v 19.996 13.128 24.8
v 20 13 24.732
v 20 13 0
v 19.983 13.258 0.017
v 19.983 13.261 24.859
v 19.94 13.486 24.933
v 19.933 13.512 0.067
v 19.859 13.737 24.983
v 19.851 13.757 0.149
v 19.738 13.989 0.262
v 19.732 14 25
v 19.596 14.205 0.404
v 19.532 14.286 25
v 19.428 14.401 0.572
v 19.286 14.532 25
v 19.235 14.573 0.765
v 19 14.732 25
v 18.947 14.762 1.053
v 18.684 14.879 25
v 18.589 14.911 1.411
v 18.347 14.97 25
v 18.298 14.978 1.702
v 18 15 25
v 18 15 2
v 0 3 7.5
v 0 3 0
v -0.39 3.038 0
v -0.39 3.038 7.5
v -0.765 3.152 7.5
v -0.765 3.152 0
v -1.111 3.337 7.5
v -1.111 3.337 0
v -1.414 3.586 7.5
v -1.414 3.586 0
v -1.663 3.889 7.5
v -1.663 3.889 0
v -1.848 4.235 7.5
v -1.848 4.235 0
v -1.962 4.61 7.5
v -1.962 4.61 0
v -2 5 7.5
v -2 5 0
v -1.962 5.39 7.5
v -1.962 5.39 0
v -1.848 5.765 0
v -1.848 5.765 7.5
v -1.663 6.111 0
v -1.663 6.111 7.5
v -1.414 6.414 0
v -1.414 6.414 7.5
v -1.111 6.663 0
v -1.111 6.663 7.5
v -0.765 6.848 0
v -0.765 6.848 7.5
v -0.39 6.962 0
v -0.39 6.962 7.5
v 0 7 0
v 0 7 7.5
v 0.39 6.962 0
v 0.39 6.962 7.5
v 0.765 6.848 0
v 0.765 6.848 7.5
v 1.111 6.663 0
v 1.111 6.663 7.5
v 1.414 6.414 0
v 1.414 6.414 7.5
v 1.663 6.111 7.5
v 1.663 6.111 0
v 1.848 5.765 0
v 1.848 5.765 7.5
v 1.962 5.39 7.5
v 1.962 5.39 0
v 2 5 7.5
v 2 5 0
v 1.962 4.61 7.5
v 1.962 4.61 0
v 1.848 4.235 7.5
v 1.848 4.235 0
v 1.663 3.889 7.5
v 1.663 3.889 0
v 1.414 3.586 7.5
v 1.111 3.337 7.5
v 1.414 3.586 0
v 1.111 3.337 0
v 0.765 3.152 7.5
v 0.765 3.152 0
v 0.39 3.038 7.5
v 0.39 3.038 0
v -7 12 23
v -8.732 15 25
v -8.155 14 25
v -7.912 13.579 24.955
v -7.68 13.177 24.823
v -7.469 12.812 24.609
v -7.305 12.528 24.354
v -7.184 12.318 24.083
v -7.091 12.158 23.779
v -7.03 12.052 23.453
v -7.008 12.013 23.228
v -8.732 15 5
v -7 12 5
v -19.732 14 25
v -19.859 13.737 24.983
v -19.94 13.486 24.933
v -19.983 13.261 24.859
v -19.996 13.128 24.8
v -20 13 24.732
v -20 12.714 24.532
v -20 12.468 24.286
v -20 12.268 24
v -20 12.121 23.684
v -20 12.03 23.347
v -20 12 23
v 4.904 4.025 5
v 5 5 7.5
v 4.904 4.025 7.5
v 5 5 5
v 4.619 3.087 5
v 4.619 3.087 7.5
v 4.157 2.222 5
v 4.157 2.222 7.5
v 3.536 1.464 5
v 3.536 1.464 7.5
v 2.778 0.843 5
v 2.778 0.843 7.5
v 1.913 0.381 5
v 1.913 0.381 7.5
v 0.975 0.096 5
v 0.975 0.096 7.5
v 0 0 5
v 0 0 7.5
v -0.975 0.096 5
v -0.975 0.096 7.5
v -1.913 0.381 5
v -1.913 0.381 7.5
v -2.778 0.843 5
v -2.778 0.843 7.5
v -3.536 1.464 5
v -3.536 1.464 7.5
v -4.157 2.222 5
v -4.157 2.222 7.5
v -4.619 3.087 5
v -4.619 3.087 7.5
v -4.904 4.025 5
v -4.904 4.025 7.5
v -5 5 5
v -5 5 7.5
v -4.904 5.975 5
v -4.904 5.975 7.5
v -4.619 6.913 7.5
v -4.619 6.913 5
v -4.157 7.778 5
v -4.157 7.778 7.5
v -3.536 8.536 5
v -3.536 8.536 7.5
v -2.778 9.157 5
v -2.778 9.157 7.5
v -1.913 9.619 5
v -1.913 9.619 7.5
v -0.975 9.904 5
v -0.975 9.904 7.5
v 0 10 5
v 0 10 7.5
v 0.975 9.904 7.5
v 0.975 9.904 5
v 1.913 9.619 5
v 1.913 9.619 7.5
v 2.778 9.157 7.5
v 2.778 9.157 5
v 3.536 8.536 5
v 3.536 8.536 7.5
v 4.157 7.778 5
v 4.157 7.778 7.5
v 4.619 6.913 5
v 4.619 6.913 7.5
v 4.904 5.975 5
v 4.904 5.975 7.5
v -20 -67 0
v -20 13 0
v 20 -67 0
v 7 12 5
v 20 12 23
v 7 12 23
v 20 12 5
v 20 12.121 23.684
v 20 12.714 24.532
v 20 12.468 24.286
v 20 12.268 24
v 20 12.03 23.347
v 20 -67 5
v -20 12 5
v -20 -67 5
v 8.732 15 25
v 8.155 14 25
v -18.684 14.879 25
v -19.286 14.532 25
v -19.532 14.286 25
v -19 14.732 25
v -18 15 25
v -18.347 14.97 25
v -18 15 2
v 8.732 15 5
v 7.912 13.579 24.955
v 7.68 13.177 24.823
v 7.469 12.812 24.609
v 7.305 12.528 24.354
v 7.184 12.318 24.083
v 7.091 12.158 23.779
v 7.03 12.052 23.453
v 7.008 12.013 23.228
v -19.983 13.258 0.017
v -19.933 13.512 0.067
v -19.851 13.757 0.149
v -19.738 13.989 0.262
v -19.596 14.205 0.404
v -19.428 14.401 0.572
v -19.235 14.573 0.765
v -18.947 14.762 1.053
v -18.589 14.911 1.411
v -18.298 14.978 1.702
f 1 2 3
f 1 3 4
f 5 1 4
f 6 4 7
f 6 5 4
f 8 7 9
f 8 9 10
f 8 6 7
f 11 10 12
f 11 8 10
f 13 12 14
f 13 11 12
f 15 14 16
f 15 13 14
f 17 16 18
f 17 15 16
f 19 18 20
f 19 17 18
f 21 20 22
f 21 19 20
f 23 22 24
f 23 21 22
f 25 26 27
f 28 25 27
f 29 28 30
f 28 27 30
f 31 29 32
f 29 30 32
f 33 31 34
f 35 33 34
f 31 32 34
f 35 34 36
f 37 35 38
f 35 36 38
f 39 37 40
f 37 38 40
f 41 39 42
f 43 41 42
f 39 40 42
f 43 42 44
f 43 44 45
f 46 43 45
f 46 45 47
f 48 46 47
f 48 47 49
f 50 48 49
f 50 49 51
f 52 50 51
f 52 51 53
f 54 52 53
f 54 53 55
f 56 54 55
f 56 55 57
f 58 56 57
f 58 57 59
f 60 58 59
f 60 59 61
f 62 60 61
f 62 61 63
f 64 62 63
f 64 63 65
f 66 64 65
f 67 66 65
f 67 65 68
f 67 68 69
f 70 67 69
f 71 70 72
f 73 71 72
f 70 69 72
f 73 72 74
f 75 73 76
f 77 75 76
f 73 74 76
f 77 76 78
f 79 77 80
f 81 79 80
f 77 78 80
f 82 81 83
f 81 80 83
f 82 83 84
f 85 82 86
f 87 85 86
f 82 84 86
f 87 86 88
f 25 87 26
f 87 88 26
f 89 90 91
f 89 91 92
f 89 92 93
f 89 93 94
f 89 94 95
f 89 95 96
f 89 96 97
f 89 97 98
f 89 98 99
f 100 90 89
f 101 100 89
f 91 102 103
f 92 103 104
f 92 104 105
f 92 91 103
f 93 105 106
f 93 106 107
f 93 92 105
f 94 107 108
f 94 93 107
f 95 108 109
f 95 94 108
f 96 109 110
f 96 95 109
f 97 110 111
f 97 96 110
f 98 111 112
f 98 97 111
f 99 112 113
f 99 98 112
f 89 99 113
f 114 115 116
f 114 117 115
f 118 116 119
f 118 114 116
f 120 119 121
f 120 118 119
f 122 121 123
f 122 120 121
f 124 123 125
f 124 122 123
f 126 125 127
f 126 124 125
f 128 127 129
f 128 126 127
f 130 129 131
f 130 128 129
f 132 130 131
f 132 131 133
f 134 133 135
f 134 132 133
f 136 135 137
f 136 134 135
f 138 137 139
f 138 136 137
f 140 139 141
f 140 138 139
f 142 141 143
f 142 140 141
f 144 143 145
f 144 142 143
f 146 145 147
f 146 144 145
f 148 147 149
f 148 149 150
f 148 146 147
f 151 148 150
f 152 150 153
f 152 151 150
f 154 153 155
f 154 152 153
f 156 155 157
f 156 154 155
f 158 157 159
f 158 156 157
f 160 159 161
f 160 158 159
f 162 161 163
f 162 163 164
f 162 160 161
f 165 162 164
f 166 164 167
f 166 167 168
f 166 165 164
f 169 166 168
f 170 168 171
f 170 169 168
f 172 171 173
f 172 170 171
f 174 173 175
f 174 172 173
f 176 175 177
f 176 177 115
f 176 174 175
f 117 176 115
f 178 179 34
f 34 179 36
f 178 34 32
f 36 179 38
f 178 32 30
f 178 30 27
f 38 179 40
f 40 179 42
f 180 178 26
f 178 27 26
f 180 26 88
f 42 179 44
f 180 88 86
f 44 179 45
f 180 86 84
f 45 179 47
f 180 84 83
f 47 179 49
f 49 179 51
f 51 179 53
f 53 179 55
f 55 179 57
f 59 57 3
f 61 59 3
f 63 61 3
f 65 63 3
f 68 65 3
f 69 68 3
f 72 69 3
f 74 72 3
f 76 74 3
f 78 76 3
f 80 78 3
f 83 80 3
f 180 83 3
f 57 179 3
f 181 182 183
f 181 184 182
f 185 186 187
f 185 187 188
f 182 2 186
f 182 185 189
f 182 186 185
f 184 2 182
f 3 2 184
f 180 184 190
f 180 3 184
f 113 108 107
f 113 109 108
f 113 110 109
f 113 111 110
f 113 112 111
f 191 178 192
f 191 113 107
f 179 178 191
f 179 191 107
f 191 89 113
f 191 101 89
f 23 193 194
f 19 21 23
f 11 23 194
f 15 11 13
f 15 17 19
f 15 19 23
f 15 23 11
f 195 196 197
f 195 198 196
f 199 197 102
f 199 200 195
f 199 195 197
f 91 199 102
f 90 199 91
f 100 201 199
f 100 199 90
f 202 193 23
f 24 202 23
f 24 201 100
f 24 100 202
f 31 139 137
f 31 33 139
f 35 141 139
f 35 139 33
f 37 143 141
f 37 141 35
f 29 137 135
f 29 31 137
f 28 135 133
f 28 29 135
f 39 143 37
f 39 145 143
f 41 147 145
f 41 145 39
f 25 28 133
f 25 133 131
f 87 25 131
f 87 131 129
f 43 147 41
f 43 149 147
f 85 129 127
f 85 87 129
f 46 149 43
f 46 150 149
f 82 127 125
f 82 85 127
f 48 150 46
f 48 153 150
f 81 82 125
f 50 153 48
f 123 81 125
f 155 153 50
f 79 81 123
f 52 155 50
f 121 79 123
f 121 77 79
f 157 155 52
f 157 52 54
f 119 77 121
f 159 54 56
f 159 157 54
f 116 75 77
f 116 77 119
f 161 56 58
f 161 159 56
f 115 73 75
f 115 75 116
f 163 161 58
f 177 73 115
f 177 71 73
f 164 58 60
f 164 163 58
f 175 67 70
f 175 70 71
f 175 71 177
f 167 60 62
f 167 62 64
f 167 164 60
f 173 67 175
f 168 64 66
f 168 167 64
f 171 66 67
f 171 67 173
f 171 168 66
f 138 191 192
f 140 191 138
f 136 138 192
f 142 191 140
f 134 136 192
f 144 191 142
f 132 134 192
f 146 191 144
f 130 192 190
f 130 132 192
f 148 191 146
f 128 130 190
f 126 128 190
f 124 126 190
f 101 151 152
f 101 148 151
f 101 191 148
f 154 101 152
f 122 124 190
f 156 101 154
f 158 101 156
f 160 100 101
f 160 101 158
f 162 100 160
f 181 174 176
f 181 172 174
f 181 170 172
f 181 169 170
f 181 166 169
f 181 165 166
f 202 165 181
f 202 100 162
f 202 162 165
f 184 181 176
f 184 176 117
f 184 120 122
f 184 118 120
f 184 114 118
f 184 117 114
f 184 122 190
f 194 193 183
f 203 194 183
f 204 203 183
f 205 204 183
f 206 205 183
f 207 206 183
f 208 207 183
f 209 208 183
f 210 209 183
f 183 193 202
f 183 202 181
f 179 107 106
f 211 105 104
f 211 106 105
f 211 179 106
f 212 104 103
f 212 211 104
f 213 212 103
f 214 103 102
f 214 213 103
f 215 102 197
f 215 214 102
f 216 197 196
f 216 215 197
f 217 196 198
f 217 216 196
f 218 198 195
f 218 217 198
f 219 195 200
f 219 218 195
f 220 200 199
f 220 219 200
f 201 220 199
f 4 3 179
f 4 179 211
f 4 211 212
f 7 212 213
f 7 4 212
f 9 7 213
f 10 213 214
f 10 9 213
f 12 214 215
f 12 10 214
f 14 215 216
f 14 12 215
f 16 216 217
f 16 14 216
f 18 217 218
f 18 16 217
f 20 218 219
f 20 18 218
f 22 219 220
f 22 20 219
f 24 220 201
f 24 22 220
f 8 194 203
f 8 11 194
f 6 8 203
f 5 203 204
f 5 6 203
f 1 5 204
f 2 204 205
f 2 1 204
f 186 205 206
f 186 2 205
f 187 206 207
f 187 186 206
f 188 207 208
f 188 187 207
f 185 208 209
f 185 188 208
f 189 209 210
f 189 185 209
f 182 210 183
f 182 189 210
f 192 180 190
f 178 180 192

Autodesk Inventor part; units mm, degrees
ref_plane "YZ Plane" through (0, 0, 0) normal (1, 0, 0) x (0, 1, 0)
ref_plane "XZ Plane" through (0, 0, 0) normal (0, 1, 0) x (-1, 0, 0)
ref_plane "XY Plane" through (0, 0, 0) normal (0, 0, 1) x (1, 0, 0)
sketch "Skizze1" plane through (0, 0, 0) normal (0, 0, 1) x (1, 0, 0)
  line L0 (-20, 15) -> (20, 15)
  line L1 (20, 15) -> (20, -67)
  line L2 (20, -67) -> (-20, -67)
  line L3 (-20, -67) -> (-20, 15)
  line L4 (0, -83.4) -> (0, 31.4) projected
  point P0 (0, 0)
  point P1 (0, 15)
  dimension "d2" = 82
  dimension "d4" = 15
  dimension "d42" = 40
extrude "Extrusion1" add sketch "Skizze1" along normal blind 5
sketch "Skizze2" plane through (0, 0, 5) normal (0, 0, 1) x (1, 0, 0)
  line L0 (20, 15) -> (-20, 15) projected
  circle A0 centre (0, 5) radius 5
  line L1 (0, -83.4) -> (0, 31.4) projected
  point P0 (0, 0)
  dimension "d10" = 10
  dimension "d11" = 10
extrude "Extrusion2" add sketch "Skizze2" along normal blind 2.5
sketch "Skizze3" plane through (0, 5, 7.5) normal (0, 0, 1) x (1, 0, 0)
  circle A0 centre (0, 0) radius 5 projected
  circle A1 centre (0, 0) radius 1
  point P0 (0, -5)
  dimension "d15" = 2
hole "Bohrung1" at (0, 5, 7.5) direction (0, 0, -1) diameter 4 end through all
sketch "Skizze6" plane through (0, 0, 5) normal (0, 0, 1) x (1, 0, 0)
  line L0 (20, -67) -> (20, 15) projected
  line L1 (20, 15) -> (-20, 15) projected
  circle A0 centre (0, 5) radius 5 projected
  line L2 (-20, -67) -> (20, -67) projected
  line L3 (-20, 15) -> (-20, -67) projected
sketch "Skizze7" plane through (0, 0, 5) normal (0, 0, 1) x (1, 0, 0)
  circle A0 centre (0, 5) radius 5 projected
  line L0 (-20, -67) -> (20, -67) projected
  line L1 (20, -67) -> (20, 15) projected
  line L2 (20, 15) -> (-20, 15) projected
  line L3 (-20, 15) -> (-20, -67) projected
  point P0 (0, 0)
sketch "Skizze9" plane through (0, 0, 5) normal (0, 0, 1) x (1, 0, 0)
  line L0 (20, -67) -> (20, 15) projected
  line L1 (20, 15) -> (-20, 15) projected
  line L2 (-20, 15) -> (-20, -67) projected
  line L3 (20, 15) -> (20, 12)
  line L4 (20, 12) -> (-20, 12)
  line L5 (-20, 12) -> (-20, 15)
  line L6 (-8.7321, 15) -> (-7, 12)
  line L7 (8.7321, 15) -> (7, 12)
  line L8 (8.7321, 15) -> (12.1962, 15) construction
  line L9 (-20, 15) -> (-8.7321, 15)
  line L10 (8.7321, 15) -> (20, 15)
  point P0 (0, 0)
  point P1 (-8.7321, 15)
  dimension "d52" = 3
  dimension "d54" = 120
  dimension "d56" = 13
  dimension "d57" = 13
  dimension "d60" = 120
extrude "Extrusion6" add sketch "Skizze9" along normal blind 20 contours L4 L7 L1 L0 | L4 L2 L1 L6
fillet "Rundung1" radius 2 5 edges at (20, 15, 12.5) (-20, 15, 12.5) (0, 15, 0) (13.5, 12, 25) (-13.5, 12, 25)
properties part number "Gehäuse" material "1.2067 100 Cr 6 (WS)"
